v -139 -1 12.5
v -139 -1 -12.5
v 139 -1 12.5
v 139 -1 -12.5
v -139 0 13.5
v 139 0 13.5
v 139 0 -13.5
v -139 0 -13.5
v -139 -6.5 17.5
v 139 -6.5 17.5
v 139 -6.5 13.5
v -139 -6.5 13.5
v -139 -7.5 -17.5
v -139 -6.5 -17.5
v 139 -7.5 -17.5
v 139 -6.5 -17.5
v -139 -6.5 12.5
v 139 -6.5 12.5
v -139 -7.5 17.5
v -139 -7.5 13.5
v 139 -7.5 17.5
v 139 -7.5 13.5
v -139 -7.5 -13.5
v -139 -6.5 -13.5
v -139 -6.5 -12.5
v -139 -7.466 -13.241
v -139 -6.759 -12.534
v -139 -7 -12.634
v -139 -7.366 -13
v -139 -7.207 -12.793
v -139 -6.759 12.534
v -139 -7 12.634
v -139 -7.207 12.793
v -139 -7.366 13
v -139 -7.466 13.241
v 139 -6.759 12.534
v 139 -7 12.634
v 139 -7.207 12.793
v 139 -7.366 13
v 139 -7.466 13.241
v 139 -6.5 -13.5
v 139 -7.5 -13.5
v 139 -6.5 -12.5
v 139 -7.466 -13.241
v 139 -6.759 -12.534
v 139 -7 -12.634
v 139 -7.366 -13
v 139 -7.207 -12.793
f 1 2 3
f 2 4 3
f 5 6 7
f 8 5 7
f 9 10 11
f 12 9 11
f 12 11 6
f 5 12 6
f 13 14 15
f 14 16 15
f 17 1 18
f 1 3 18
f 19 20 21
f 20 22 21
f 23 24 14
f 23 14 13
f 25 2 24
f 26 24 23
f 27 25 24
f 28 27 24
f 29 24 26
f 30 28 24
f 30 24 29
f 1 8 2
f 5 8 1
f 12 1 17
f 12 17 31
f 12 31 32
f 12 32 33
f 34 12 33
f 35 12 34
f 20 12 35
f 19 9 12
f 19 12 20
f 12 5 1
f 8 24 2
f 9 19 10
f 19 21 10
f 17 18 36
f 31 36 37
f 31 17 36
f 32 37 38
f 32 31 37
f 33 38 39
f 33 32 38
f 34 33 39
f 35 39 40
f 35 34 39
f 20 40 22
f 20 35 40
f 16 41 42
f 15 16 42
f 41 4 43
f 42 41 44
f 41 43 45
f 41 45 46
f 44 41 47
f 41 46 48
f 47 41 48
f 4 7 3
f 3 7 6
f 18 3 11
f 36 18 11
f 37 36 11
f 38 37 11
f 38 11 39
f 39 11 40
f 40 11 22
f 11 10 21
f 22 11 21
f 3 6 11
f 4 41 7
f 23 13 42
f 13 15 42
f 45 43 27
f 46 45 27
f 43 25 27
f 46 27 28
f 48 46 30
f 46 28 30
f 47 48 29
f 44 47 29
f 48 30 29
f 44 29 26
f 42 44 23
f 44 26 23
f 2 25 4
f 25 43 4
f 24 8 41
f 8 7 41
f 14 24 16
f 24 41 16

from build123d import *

# Parameters (mm, degrees)
PAD005_DEPTH = 139
FILLET_R     = 1
FILLET001_R  = 1


with BuildPart() as part:
    # Sketch005 → Pad005 (new body, symmetric)
    with BuildSketch(Plane.YZ):
        Polygon((0, 13.5), (0, -13.5), (-6.5, -13.5), (-6.5, -17.5), (-7.5, -17.5), (-7.5, -12.5), (-1, -12.5), (-1, 12.5), (-7.5, 12.5), (-7.5, 17.5), (-6.5, 17.5), (-6.5, 13.5), align=None)
    extrude(amount=PAD005_DEPTH, both=True)

    # Fillet
    fillet_edges = [part.edges().sort_by_distance(p)[0] for p in [
        (0, -7.5, -12.5),
    ]]
    fillet(fillet_edges, radius=FILLET_R)

    # Fillet001
    fillet001_edges = [part.edges().sort_by_distance(p)[0] for p in [
        (0, -7.5, 12.5),
    ]]
    fillet(fillet001_edges, radius=FILLET001_R)


solid = part.part
